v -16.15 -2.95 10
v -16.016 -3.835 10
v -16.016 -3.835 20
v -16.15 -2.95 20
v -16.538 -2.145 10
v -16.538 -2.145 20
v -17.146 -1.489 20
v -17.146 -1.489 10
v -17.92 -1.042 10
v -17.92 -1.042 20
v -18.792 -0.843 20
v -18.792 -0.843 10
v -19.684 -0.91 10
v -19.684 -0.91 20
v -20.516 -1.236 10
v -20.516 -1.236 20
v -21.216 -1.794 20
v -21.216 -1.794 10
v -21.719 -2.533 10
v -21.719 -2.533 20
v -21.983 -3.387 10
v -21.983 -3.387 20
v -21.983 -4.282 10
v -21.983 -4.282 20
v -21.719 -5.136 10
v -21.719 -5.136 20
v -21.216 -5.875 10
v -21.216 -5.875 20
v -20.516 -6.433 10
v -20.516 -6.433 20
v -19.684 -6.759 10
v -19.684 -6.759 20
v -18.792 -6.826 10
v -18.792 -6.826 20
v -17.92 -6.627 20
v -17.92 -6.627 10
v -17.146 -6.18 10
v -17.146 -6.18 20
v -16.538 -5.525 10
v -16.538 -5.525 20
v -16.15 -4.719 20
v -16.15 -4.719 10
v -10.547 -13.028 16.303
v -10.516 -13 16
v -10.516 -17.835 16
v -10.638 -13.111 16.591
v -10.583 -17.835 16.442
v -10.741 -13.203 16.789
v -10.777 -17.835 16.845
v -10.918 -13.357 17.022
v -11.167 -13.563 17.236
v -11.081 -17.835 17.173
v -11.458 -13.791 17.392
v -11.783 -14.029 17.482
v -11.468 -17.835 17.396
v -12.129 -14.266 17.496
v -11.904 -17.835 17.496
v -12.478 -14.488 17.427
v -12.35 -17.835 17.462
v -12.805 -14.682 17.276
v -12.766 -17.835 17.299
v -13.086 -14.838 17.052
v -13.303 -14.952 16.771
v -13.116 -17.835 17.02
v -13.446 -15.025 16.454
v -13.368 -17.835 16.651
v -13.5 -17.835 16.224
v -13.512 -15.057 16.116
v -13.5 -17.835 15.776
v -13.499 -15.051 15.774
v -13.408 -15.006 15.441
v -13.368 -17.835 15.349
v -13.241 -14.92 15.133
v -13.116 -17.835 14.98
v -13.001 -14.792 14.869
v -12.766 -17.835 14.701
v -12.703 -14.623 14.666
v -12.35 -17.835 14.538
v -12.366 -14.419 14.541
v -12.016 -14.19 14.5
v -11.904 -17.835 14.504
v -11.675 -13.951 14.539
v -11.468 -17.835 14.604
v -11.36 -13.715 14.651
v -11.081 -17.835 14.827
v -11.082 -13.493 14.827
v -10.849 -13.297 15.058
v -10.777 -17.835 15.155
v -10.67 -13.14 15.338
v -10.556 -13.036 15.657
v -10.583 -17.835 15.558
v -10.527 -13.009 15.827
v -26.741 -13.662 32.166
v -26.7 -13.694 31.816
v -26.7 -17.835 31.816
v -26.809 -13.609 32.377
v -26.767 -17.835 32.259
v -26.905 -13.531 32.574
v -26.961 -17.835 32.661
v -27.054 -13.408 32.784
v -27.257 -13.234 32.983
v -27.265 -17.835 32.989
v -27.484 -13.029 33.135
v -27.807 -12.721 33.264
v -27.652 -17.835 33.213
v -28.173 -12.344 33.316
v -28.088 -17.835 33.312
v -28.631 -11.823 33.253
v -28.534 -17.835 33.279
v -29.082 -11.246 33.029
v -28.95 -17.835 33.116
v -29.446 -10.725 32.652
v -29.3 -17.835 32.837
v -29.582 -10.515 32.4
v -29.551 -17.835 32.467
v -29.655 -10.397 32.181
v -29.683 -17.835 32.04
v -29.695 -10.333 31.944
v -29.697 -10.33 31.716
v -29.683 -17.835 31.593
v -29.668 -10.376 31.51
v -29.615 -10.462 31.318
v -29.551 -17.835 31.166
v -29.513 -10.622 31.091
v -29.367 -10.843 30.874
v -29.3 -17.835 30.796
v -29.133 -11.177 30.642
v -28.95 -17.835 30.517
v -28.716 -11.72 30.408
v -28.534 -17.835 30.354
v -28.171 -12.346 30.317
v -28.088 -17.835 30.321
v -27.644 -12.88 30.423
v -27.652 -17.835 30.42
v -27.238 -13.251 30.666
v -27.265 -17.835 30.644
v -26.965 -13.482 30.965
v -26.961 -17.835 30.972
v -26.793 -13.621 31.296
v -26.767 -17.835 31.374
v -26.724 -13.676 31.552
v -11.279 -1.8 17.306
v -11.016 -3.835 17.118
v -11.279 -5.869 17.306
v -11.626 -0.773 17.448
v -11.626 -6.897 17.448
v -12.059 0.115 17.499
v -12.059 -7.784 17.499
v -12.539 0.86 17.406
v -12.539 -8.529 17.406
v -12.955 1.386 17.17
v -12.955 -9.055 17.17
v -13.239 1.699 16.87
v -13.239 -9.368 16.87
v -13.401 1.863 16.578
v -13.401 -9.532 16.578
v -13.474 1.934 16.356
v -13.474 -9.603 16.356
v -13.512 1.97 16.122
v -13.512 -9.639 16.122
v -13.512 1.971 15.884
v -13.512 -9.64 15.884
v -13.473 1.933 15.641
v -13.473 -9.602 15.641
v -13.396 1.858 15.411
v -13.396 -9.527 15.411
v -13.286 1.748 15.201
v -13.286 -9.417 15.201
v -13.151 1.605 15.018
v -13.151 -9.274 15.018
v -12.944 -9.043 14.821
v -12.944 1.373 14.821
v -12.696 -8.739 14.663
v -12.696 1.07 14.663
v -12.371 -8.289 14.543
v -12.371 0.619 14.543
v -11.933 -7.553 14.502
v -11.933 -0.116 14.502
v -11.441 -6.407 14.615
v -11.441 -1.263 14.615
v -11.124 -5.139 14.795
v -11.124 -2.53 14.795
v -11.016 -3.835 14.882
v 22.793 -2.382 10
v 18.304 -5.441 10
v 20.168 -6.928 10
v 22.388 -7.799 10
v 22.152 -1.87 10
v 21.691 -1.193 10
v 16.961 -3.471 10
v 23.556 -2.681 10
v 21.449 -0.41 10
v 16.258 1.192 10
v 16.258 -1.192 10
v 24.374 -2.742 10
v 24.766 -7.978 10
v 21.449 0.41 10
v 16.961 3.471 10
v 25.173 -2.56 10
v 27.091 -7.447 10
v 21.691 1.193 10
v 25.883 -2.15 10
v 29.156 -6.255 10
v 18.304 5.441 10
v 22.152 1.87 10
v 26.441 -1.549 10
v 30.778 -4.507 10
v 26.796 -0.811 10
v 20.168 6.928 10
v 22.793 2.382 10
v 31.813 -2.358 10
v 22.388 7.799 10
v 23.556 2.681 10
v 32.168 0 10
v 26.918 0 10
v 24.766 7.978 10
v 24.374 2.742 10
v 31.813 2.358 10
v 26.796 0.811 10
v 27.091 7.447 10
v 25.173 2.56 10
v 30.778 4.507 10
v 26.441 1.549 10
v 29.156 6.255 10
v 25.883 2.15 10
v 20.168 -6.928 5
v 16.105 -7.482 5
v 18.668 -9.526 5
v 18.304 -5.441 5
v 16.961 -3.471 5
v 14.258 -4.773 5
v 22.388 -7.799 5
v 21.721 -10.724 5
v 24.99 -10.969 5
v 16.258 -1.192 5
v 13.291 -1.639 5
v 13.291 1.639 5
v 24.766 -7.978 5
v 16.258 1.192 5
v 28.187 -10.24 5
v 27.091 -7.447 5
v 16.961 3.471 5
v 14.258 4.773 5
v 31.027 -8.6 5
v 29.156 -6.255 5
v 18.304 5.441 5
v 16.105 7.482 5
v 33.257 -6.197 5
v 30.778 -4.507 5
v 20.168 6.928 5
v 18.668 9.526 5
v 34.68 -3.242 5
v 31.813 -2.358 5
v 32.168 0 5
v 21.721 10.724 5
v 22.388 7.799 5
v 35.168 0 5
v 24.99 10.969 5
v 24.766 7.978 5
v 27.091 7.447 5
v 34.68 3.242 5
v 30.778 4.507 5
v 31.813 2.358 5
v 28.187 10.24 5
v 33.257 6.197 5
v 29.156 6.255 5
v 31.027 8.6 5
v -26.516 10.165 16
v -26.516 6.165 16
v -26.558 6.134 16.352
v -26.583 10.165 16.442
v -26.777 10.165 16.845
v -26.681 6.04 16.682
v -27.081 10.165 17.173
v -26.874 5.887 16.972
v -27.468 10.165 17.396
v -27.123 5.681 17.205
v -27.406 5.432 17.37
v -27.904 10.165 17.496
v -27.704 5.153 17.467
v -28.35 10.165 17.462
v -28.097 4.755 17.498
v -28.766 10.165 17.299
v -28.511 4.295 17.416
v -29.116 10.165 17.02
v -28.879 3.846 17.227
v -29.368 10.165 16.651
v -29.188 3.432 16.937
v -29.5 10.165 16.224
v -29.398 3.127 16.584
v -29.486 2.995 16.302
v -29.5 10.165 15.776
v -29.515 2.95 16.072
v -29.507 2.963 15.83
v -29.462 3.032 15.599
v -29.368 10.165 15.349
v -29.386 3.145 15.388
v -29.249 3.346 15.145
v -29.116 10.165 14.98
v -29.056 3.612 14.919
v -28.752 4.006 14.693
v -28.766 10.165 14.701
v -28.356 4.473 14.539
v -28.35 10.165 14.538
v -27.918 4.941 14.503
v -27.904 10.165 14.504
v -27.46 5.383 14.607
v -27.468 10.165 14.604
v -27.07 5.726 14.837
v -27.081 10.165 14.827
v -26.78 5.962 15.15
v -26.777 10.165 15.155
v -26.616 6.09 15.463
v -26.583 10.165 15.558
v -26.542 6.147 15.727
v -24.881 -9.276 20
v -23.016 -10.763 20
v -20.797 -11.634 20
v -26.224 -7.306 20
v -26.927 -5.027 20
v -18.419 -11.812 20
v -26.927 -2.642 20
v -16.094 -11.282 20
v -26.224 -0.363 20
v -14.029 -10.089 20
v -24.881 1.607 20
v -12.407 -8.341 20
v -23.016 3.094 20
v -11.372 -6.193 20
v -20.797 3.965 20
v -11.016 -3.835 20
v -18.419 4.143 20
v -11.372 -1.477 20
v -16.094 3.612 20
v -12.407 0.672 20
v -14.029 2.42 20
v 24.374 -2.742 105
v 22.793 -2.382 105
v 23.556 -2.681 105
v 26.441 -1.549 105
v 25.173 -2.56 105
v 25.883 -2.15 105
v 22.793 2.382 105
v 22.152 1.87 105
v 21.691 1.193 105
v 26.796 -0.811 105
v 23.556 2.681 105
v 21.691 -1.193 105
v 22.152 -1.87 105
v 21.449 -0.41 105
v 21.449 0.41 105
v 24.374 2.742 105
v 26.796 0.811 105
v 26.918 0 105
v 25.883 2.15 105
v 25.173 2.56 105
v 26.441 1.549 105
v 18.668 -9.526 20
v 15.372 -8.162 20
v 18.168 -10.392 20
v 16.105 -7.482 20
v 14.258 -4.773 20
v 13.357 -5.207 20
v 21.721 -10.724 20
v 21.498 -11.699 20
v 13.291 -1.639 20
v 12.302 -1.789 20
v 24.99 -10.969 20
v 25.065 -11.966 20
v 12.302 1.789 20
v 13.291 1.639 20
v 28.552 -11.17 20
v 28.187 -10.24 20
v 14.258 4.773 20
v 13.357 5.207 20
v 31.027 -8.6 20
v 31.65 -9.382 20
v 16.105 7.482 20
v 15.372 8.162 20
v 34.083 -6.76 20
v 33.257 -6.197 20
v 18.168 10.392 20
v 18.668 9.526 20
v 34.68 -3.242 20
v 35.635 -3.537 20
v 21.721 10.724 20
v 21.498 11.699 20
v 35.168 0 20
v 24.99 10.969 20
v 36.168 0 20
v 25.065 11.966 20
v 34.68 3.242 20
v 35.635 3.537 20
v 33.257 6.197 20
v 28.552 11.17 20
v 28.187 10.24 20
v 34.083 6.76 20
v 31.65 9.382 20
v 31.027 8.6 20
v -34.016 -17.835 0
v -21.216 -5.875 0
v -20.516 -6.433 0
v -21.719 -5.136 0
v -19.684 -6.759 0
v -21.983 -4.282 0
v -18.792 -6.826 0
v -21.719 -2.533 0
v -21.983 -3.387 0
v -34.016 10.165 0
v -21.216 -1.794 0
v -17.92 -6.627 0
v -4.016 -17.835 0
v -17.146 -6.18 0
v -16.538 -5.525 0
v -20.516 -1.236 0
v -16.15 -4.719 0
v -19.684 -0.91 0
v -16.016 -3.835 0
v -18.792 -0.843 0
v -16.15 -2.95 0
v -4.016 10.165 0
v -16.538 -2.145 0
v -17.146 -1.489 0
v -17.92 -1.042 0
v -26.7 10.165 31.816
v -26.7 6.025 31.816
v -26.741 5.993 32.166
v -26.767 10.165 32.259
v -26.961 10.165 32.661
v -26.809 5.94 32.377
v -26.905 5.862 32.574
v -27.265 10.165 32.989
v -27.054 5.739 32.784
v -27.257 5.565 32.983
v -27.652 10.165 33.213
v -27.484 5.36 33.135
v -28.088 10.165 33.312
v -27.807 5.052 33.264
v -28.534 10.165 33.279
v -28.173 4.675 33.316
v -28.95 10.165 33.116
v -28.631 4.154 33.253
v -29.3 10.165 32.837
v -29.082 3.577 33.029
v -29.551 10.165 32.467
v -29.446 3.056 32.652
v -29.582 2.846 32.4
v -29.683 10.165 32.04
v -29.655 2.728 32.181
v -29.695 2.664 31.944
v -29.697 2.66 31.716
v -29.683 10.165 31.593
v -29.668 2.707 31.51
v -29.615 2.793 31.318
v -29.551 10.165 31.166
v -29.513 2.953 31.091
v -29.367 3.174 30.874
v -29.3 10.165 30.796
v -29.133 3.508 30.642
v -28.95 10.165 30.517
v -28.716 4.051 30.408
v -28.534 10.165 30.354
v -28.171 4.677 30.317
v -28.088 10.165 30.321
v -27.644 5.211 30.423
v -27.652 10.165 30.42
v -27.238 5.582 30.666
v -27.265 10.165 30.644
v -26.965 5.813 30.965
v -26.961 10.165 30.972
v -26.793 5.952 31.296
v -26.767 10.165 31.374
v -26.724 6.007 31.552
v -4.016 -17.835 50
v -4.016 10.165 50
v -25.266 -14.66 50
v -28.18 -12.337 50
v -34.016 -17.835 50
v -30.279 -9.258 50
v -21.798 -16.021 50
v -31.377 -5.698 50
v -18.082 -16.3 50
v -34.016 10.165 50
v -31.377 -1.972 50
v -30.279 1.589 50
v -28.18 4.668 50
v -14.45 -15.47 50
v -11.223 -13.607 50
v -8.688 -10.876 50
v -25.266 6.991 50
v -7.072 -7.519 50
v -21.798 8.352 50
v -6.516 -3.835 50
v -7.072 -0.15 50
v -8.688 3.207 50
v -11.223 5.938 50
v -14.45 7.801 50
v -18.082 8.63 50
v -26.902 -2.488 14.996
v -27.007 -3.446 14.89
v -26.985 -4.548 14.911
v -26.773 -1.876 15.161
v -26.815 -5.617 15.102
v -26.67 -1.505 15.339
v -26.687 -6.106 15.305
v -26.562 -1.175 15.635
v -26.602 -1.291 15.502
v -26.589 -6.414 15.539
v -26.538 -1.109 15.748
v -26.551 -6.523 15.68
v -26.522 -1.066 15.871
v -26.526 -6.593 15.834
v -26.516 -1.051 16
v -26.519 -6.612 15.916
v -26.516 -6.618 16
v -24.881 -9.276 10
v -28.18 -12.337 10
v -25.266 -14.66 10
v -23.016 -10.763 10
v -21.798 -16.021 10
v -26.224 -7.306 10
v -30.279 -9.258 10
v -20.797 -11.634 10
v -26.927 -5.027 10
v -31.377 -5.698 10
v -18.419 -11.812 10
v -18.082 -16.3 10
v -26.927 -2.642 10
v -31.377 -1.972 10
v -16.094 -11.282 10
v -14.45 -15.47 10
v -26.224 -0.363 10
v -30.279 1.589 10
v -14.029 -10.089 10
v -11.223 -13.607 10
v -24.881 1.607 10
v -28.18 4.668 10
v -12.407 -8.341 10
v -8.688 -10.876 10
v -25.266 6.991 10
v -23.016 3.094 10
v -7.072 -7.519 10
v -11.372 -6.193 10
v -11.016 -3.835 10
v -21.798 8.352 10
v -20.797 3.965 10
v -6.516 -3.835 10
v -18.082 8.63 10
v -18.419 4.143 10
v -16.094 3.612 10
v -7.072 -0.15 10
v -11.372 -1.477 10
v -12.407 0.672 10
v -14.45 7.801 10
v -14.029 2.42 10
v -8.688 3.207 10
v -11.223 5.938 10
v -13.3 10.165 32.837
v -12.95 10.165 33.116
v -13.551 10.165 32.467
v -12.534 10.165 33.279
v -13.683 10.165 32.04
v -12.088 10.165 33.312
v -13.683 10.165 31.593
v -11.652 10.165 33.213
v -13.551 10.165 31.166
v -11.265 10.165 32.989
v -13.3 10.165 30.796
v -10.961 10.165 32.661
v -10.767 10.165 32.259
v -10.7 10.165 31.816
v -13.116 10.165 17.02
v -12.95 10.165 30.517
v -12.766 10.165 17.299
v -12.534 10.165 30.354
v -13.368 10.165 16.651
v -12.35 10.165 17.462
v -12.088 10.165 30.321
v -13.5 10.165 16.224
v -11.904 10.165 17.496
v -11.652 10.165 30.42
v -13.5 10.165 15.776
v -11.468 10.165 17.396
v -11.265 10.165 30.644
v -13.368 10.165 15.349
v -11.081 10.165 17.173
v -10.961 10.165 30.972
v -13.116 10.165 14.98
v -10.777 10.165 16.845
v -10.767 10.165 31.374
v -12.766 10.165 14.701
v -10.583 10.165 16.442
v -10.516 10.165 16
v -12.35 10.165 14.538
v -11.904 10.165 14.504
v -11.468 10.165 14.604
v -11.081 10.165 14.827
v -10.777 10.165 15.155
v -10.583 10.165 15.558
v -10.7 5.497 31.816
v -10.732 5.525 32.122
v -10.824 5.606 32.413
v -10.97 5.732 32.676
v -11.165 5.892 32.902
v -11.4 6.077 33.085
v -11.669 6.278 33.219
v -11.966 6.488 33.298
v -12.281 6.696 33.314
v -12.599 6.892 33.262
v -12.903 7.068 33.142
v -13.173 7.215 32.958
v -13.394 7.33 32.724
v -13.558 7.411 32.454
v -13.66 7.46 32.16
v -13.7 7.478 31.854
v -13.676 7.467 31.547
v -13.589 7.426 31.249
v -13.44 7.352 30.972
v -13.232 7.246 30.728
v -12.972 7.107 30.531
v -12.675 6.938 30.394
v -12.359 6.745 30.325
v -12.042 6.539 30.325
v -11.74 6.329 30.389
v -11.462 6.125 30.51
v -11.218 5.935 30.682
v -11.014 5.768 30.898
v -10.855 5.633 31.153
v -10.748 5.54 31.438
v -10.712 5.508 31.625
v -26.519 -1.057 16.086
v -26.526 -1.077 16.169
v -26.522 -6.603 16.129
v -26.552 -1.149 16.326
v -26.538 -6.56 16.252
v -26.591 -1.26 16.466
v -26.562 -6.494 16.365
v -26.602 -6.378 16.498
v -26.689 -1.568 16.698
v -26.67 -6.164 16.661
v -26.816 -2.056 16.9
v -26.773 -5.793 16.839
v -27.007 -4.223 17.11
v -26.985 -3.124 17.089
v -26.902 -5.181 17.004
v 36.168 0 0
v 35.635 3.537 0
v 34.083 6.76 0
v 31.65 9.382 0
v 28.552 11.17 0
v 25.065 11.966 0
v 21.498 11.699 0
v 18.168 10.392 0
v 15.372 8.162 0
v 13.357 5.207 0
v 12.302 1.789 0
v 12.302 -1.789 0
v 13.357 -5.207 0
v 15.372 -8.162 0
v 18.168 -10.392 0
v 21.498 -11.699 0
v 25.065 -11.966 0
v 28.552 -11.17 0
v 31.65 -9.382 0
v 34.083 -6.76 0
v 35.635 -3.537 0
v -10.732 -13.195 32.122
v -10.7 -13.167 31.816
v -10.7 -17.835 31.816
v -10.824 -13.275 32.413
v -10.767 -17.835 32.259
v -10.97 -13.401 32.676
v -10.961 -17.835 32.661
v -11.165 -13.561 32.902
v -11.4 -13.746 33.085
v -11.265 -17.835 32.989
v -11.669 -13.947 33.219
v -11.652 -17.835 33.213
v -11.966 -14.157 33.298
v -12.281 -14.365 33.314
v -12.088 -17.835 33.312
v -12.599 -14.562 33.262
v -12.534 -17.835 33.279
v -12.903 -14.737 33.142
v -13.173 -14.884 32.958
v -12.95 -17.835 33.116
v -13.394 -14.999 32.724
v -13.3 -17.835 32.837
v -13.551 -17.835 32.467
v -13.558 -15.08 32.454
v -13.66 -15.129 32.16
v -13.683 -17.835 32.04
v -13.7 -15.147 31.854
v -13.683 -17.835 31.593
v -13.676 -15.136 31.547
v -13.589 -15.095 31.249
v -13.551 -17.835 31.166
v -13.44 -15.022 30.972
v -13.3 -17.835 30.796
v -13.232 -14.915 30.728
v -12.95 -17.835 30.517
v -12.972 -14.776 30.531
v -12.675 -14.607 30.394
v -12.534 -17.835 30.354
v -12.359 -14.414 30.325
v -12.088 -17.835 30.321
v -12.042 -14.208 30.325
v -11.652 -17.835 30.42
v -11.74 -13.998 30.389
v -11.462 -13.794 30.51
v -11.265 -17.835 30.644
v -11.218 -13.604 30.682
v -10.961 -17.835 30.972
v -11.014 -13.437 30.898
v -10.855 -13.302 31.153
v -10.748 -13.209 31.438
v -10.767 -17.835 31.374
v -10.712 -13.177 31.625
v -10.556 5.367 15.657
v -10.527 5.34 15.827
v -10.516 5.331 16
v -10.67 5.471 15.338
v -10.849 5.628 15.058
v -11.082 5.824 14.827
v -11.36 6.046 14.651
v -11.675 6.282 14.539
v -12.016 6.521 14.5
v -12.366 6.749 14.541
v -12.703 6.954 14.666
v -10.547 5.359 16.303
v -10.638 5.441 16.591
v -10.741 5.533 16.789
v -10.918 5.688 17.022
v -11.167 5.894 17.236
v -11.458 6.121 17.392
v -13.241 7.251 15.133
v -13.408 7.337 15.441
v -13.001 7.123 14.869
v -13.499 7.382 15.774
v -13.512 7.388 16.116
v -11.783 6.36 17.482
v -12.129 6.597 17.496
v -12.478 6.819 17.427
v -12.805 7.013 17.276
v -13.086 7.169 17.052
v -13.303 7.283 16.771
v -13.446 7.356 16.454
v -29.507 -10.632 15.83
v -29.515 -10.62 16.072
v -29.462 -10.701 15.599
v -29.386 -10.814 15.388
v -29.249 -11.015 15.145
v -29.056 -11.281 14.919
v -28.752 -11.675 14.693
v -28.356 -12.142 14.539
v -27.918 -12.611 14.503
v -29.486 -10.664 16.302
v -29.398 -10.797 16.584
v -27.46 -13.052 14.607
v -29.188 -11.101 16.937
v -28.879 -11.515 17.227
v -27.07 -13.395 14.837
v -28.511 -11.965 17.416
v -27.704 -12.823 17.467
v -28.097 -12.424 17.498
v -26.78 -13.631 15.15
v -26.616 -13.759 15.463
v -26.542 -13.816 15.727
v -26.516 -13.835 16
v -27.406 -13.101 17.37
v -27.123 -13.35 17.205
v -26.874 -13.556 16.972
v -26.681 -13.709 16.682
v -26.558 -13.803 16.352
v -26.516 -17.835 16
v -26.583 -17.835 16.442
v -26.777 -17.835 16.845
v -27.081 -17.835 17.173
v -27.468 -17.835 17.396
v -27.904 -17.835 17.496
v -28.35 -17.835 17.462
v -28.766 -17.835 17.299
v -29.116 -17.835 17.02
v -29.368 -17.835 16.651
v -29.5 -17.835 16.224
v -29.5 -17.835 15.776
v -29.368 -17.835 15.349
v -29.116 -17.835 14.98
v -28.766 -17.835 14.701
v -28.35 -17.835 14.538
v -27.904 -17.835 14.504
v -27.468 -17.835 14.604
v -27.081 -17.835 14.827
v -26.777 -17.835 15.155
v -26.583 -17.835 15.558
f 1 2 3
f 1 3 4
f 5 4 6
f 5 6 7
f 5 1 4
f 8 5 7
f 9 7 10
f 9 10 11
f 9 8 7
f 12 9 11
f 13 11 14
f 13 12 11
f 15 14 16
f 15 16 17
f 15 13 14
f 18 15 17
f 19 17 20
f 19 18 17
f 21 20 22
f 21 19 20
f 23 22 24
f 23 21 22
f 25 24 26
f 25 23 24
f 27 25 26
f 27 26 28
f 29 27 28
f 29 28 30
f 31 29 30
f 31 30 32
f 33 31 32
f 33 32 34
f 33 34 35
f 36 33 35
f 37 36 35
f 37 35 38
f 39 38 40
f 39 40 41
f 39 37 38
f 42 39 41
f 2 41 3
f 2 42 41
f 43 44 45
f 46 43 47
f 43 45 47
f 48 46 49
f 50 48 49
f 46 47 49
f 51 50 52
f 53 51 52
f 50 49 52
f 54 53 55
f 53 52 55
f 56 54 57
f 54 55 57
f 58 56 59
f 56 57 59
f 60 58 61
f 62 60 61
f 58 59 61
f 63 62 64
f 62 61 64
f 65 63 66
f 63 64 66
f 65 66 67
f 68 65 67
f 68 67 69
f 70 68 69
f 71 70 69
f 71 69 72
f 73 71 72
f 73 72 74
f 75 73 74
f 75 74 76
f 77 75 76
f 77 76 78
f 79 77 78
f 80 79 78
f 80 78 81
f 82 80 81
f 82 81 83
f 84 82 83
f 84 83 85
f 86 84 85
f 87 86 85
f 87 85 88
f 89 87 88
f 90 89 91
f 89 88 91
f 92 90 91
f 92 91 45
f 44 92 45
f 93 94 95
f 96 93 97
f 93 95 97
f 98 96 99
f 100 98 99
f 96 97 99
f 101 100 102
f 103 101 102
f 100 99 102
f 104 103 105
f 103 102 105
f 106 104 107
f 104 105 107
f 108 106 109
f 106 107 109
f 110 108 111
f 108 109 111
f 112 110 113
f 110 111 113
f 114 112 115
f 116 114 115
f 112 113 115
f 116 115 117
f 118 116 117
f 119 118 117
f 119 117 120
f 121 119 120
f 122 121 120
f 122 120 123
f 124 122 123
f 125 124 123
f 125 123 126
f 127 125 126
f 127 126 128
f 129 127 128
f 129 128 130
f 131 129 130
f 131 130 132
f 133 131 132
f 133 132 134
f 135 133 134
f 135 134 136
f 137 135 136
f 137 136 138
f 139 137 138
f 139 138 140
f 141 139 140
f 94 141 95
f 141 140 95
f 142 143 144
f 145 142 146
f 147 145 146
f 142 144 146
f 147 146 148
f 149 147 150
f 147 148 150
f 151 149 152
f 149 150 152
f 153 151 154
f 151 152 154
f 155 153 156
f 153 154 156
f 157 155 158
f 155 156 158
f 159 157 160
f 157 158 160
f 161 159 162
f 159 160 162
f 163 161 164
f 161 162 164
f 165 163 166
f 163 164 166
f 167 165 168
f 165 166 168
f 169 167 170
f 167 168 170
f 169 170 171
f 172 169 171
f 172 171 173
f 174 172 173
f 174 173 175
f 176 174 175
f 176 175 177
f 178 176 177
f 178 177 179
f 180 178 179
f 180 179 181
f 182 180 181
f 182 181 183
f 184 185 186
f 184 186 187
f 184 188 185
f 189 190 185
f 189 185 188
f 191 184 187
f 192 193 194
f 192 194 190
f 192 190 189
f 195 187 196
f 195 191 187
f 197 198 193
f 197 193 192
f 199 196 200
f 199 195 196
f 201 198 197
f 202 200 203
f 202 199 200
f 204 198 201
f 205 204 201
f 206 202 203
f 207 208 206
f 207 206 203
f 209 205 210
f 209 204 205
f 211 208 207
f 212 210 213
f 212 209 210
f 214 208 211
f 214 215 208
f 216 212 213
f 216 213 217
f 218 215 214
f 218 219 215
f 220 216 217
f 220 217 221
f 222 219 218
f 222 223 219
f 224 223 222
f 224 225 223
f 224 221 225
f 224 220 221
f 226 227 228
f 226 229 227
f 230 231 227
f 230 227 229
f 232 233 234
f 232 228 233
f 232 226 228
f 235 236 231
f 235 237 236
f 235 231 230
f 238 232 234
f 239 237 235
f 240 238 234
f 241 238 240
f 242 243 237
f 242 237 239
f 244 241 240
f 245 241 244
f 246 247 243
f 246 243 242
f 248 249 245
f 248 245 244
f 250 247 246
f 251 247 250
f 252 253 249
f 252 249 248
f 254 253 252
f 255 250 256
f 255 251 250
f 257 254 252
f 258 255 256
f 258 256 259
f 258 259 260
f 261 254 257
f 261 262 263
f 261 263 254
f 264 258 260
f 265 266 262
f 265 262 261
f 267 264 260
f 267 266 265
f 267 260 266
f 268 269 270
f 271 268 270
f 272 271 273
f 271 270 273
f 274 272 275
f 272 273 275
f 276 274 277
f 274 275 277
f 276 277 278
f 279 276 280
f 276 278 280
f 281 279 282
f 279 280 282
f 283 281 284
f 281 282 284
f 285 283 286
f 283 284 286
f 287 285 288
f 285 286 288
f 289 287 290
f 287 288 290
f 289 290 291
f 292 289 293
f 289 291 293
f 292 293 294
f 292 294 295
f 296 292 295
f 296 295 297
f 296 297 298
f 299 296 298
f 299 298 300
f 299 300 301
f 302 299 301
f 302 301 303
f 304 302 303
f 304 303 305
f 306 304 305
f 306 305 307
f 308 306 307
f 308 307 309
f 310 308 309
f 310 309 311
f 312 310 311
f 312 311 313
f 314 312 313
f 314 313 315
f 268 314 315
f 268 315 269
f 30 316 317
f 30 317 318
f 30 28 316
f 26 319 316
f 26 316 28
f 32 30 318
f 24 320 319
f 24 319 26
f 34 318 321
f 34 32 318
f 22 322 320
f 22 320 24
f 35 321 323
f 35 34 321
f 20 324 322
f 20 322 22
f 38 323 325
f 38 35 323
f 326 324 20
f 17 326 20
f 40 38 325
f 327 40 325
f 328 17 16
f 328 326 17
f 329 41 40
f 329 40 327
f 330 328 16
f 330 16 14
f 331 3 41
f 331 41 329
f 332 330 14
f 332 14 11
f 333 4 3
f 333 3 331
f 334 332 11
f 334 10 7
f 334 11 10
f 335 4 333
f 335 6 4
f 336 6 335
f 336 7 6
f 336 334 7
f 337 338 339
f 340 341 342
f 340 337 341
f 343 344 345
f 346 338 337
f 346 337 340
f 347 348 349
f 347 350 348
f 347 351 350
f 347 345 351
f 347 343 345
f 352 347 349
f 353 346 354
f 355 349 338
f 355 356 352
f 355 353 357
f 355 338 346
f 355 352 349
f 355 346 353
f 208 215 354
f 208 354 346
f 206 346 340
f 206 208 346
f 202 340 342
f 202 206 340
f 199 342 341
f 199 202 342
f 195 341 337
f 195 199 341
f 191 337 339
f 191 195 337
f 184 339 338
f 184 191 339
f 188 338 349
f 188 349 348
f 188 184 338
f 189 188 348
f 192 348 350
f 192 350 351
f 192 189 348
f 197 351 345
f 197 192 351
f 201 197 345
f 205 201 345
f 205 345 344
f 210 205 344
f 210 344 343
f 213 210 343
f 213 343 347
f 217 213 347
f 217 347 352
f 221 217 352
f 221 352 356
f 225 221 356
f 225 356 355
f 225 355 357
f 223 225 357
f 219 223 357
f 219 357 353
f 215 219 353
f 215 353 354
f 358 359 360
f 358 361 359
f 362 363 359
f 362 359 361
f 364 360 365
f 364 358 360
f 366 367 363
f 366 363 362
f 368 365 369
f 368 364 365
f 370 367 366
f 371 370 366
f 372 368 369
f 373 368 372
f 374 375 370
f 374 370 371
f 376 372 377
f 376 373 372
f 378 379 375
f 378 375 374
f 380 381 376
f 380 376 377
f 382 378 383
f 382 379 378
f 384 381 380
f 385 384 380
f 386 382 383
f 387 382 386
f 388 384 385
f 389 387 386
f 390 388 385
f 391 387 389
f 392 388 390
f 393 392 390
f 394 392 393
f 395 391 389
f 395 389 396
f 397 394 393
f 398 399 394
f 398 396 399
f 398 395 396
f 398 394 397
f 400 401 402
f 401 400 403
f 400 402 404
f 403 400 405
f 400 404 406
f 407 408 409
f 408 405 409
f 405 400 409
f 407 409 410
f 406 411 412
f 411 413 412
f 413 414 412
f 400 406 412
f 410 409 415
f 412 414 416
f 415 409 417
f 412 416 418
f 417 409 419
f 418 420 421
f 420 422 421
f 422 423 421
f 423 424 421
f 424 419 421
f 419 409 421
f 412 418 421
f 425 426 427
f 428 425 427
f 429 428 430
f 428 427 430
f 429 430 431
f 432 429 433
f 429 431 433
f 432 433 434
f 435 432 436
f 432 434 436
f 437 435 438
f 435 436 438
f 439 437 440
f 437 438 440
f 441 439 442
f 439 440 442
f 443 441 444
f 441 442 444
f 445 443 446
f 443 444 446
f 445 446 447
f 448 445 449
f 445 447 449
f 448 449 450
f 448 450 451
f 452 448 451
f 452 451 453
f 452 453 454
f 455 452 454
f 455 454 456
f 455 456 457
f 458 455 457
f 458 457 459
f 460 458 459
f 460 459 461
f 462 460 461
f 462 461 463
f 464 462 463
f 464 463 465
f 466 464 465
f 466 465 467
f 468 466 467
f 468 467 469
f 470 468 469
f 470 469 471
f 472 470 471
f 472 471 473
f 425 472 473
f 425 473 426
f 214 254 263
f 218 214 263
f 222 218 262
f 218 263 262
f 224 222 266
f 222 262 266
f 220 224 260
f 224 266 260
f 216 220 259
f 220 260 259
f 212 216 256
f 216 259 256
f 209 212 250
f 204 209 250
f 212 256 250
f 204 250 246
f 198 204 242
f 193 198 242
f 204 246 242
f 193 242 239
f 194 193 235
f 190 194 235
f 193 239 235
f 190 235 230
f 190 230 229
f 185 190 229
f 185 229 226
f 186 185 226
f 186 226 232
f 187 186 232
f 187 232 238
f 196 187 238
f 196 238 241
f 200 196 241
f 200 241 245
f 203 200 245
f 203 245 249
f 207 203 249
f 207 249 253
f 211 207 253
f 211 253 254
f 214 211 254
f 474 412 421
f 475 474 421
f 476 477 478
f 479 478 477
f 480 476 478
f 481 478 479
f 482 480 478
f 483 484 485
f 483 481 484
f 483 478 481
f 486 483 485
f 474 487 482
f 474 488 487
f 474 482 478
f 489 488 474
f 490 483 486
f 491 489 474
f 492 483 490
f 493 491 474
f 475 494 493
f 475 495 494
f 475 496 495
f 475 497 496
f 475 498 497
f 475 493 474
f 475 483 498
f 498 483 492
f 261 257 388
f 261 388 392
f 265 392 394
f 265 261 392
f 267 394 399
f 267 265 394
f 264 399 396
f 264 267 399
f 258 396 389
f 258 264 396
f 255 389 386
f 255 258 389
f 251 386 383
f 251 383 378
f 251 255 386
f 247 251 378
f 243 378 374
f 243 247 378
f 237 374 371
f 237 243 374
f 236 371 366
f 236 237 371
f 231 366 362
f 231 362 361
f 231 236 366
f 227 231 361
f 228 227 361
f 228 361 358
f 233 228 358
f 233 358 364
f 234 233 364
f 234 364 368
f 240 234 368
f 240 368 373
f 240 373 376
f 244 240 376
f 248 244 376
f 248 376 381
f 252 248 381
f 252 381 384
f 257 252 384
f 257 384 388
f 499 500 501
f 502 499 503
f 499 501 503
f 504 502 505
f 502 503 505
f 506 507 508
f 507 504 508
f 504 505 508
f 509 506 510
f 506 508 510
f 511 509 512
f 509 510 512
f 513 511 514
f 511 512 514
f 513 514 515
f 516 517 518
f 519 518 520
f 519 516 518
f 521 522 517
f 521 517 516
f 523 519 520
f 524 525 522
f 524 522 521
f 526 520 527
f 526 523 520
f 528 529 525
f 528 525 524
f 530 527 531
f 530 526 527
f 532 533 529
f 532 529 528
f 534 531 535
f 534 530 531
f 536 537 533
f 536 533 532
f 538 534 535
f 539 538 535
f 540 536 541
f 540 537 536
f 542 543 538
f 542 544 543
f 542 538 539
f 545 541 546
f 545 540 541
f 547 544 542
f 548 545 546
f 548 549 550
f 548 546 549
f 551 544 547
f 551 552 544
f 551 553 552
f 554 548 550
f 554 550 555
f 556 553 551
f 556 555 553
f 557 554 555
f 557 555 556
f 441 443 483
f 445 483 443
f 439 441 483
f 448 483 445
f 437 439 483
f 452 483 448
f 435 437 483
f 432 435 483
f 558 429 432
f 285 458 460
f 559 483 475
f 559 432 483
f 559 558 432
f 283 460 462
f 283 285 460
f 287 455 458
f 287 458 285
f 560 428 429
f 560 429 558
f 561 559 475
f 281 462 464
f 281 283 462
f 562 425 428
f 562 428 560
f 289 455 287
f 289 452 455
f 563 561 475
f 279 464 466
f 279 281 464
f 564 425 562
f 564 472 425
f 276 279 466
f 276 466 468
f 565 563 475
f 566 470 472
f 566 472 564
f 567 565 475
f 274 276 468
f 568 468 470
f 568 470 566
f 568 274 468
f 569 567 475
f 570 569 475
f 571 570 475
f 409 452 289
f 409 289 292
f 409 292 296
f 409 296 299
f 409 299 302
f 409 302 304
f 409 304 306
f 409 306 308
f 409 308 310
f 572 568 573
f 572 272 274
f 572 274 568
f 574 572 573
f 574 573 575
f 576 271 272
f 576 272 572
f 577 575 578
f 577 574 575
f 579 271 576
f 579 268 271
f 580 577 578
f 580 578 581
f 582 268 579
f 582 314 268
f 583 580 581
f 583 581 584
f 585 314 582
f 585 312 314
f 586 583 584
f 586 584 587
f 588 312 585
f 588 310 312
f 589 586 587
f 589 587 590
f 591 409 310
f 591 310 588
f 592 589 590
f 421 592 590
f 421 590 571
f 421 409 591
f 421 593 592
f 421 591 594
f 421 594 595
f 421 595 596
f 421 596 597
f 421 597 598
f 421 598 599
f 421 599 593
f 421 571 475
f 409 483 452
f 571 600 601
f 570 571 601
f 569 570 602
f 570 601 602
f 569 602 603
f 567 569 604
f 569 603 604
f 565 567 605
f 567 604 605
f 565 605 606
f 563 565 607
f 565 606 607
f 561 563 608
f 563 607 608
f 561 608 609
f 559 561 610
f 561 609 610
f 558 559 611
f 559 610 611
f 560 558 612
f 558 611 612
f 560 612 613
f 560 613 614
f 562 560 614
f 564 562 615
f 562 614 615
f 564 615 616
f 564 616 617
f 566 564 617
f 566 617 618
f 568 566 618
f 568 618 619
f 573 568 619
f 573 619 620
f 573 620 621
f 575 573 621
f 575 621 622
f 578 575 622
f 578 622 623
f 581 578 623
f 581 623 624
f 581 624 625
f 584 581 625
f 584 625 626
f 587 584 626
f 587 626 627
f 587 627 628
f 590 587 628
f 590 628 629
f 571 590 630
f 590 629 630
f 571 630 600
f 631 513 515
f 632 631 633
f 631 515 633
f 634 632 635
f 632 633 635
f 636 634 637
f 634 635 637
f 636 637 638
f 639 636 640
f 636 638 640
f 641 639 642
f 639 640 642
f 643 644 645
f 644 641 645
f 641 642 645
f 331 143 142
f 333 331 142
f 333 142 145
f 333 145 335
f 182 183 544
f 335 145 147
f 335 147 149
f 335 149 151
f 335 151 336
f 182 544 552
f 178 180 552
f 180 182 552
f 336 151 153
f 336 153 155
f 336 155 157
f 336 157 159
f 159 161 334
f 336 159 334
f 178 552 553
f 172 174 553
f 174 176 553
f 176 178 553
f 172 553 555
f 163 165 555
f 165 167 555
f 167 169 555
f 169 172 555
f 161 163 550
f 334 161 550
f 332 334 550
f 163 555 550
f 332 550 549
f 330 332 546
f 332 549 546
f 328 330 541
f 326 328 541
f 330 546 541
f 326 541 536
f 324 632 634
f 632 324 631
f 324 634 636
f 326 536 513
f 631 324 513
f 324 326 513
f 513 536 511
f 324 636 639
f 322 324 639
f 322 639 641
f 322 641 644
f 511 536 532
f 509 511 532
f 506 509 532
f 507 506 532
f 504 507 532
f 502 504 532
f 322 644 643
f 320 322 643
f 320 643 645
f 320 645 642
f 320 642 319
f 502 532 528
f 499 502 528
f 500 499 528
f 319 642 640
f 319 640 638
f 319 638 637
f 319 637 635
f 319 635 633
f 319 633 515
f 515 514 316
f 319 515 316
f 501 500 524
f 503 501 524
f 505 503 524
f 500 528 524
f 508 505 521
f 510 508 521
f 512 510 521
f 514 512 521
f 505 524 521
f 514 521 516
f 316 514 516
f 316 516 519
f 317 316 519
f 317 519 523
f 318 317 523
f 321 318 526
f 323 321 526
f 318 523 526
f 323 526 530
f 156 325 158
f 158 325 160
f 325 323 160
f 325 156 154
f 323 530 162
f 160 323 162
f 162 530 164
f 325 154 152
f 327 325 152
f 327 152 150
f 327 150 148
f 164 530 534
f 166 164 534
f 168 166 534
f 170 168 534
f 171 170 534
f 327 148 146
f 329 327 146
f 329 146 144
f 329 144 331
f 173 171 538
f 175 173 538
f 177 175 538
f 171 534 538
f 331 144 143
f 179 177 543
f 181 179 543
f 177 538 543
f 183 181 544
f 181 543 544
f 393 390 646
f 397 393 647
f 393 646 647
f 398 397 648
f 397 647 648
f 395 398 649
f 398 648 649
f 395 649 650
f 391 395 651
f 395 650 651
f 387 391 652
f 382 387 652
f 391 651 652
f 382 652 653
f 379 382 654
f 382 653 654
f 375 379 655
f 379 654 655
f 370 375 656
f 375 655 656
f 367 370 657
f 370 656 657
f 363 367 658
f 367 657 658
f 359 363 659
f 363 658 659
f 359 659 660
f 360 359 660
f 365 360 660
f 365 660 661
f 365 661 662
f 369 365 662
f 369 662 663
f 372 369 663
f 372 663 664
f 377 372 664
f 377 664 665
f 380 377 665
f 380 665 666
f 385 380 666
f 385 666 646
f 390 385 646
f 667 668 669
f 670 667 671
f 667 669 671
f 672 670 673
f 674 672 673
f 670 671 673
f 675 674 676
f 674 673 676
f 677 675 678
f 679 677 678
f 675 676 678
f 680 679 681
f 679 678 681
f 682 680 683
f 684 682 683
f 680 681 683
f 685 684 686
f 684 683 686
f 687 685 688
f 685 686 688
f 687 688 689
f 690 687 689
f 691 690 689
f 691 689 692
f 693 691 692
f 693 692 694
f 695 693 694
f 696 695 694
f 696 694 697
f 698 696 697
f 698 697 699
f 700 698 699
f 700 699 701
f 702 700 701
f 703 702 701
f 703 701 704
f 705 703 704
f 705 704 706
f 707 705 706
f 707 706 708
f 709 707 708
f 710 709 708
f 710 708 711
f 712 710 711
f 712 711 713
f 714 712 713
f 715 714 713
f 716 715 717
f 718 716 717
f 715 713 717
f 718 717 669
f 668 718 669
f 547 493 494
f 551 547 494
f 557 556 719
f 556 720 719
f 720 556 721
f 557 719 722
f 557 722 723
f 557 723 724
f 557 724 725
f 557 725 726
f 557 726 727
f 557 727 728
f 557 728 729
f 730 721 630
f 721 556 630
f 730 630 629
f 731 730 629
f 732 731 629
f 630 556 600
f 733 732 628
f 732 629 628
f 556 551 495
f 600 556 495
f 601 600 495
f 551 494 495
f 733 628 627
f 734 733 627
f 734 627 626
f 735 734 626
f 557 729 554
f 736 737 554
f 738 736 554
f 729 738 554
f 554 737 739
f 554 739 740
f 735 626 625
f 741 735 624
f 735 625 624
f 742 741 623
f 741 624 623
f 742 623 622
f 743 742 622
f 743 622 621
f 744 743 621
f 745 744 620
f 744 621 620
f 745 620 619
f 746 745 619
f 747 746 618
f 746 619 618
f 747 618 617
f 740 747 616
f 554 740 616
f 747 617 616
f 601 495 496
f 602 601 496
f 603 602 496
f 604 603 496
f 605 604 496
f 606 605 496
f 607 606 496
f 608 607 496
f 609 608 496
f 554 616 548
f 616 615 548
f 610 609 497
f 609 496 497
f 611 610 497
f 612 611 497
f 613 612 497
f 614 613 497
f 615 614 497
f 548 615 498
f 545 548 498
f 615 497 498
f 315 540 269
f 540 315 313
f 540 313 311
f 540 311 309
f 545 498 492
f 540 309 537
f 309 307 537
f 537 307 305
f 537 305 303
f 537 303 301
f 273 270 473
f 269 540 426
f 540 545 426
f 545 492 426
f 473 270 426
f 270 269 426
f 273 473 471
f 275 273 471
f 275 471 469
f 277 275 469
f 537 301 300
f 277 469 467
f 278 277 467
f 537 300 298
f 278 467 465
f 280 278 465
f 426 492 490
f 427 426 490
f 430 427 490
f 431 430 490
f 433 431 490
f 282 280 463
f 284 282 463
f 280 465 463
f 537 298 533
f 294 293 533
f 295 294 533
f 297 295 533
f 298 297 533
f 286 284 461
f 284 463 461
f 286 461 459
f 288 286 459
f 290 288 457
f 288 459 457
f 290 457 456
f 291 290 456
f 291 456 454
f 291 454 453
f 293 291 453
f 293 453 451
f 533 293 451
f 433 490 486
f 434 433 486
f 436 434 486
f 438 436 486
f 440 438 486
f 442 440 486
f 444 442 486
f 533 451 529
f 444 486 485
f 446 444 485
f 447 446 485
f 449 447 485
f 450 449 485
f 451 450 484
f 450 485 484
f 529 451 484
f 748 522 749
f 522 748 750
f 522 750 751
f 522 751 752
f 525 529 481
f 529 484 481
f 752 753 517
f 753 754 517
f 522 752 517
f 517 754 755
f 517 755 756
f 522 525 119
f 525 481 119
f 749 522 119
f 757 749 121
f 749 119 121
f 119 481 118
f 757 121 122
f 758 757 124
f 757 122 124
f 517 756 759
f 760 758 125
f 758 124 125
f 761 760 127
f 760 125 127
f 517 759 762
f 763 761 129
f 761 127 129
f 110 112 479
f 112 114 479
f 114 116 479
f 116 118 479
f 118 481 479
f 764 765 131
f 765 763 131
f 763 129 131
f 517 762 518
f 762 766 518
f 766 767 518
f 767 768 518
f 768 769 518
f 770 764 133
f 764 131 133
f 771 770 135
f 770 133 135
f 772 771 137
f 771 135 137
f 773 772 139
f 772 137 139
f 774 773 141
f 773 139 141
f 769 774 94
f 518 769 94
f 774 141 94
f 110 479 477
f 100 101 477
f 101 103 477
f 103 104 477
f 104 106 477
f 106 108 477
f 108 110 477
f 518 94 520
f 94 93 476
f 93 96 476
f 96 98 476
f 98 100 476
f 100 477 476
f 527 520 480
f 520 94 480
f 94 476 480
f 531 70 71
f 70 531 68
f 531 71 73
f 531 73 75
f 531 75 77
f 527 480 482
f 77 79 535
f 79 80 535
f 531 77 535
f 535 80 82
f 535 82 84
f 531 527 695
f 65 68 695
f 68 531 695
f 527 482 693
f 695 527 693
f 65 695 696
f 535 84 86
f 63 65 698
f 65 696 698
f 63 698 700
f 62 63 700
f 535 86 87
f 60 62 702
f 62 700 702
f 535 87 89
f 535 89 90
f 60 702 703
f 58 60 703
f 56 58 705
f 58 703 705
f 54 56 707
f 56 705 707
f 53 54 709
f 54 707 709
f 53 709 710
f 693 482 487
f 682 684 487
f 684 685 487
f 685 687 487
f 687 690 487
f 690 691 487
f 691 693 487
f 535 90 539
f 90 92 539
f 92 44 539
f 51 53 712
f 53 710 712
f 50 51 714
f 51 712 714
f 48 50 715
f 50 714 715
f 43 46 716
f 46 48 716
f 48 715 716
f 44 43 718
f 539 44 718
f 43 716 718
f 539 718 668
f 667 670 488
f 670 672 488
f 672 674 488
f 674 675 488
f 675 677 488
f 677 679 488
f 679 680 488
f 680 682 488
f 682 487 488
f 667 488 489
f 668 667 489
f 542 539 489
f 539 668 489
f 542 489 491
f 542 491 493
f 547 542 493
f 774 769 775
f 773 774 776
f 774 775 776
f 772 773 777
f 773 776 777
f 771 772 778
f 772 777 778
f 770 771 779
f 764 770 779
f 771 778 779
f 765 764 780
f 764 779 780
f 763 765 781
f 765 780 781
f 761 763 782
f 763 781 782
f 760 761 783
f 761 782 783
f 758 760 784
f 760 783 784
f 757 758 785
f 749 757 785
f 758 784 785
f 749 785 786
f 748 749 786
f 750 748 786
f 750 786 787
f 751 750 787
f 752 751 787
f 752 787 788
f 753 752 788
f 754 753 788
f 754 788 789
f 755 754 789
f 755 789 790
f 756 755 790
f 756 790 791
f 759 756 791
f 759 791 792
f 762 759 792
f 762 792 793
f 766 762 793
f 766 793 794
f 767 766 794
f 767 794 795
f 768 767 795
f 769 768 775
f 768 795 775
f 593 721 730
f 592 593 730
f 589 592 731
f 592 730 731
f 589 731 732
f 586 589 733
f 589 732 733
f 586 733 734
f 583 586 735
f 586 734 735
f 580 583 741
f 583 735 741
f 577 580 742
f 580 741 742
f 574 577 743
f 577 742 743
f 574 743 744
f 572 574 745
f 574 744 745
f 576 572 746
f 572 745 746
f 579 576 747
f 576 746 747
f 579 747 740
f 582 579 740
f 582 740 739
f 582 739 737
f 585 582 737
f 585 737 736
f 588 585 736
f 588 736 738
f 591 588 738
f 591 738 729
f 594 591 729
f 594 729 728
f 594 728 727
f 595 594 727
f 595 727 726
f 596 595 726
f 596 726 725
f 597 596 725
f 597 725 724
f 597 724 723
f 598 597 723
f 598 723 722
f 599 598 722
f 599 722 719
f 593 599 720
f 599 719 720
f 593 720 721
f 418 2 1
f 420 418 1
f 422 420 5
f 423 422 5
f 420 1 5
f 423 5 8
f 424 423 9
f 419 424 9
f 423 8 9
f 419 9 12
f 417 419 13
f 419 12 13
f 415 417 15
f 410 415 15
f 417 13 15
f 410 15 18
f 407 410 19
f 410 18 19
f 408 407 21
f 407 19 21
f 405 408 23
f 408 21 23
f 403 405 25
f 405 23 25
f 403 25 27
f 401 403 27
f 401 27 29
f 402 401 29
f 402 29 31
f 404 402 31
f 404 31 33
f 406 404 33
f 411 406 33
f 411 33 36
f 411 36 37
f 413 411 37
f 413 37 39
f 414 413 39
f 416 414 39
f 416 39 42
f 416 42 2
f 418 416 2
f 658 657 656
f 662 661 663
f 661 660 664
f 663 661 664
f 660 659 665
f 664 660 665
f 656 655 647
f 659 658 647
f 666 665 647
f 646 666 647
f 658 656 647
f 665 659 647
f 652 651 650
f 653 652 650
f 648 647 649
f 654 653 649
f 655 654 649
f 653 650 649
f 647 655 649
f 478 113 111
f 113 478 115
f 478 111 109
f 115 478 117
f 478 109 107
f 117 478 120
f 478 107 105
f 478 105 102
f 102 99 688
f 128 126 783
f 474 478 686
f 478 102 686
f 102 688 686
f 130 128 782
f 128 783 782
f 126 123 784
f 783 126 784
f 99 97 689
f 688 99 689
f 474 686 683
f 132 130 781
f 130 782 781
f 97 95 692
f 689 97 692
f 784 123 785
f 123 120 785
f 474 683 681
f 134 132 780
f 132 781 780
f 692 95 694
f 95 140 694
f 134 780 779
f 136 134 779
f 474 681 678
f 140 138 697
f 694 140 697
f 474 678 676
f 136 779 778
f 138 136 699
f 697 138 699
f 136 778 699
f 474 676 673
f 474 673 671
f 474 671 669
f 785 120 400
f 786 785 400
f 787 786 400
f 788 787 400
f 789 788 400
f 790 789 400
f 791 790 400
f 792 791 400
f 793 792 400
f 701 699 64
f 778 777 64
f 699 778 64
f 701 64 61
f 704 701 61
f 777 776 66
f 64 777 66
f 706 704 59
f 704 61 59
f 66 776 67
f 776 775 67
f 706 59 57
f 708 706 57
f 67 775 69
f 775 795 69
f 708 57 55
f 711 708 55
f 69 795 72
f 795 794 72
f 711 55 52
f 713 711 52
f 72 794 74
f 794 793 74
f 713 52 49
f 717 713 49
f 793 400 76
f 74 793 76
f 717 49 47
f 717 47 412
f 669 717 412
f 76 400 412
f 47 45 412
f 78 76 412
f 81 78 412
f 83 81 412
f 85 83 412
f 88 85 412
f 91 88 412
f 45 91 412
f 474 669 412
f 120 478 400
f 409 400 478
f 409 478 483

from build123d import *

# Parameters (mm, degrees)
F0_W      = 30
F0_H      = 28
F1_DEPTH  = 50
F2_R      = 12.5
F3_DEPTH  = 40
F4_R      = 8
F4_R_2    = 3
F5_DEPTH  = 10
F6_R      = 8
F6_R_2    = 2.75
F7_DEPTH  = 10
F6_R_3    = 12
F6_R_4    = 11
F8_DEPTH  = 20
F9_DEPTH  = 5
F10_DEPTH = 10.001
F11_DEPTH = 100
F12_R     = 1.5
F13_DEPTH = 29.8355641133


with BuildPart() as f1:
    # F0 (on Top) → F1 (new body)
    with BuildSketch(Plane.XY):
        with Locations((-19.0164810047, -3.8345641133)):
            Rectangle(F0_W, F0_H)
    extrude(amount=F1_DEPTH)

    # F2 (on face) → F3 (cut)
    with BuildSketch(Plane.XY.offset(50)):
        with Locations((-19.0164810047, -3.8345641133)):
            Circle(F2_R)
    extrude(amount=-F3_DEPTH, mode=Mode.SUBTRACT)

    # F4 (on face) → F5 (join)
    with BuildSketch(Plane.XY.offset(10)):
        with Locations((-19.0164810047, -3.8345641133)):
            Circle(F4_R)
        with Locations((-19.0164810047, -3.8345641133)):
            Circle(F4_R_2, mode=Mode.SUBTRACT)
    extrude(amount=F5_DEPTH)

    # F10 (cut, through all): a face of the model
    f10_faces = [f1.faces().sort_by_distance(p)[0] for p in [
        (-19.0164810047, -3.8345641133, 10),
    ]]
    extrude(f10_faces, amount=-F10_DEPTH, mode=Mode.SUBTRACT)

    # F12 (on face) → F13 (cut, through all)
    with BuildSketch(Plane.XZ.offset(17.8345641133)):
        with Locations((-28.2, 31.8164810047)):
            Circle(F12_R)
        with Locations((-12.2, 31.8164810047)):
            Circle(F12_R)
        with Locations((-12.0164810047, 16)):
            Circle(F12_R)
        with Locations((-28.0164810047, 16)):
            Circle(F12_R)
    extrude(amount=-F13_DEPTH, mode=Mode.SUBTRACT)


with BuildPart() as f7:
    # F6 (on Top) → F7 (new body)
    with BuildSketch(Plane.XY):
        with Locations((24.1683647183, 0)):
            Circle(F6_R)
        with Locations((24.1683647183, 0)):
            Circle(F6_R_2, mode=Mode.SUBTRACT)
    extrude(amount=F7_DEPTH)



with BuildPart() as f8:
    # F6 (on Top) → F8 (new body)
    with BuildSketch(Plane.XY):
        with Locations((24.1683647183, 0)):
            Circle(F6_R_3)
        with Locations((24.1683647183, 0)):
            Circle(F6_R_4, mode=Mode.SUBTRACT)
    extrude(amount=F8_DEPTH)


with BuildPart() as f7_1:
    add(f7.part)

    add(f8.part)  # F9 merges F8
    # F6 (on Top) → F9 (join)
    with BuildSketch(Plane.XY):
        with Locations((24.1683647183, 0)):
            Circle(F6_R_3)
        with Locations((24.1683647183, 0)):
            Circle(F6_R_4, mode=Mode.SUBTRACT)
        with Locations((24.1683647183, 0)):
            Circle(F6_R_4)
        with Locations((24.1683647183, 0)):
            Circle(F6_R, mode=Mode.SUBTRACT)
        with Locations((24.1683647183, 0)):
            Circle(F6_R)
        with Locations((24.1683647183, 0)):
            Circle(F6_R_2, mode=Mode.SUBTRACT)
        with Locations((24.1683647183, 0)):
            Circle(F6_R_2)
    extrude(amount=F9_DEPTH)

    # F11 (add): a face of the model
    f11_faces = [f7_1.faces().sort_by_distance(p)[0] for p in [
        (24.1683647183, 0, 5),
    ]]
    extrude(f11_faces, amount=F11_DEPTH)


solid = Compound([f1.part, f7_1.part])
